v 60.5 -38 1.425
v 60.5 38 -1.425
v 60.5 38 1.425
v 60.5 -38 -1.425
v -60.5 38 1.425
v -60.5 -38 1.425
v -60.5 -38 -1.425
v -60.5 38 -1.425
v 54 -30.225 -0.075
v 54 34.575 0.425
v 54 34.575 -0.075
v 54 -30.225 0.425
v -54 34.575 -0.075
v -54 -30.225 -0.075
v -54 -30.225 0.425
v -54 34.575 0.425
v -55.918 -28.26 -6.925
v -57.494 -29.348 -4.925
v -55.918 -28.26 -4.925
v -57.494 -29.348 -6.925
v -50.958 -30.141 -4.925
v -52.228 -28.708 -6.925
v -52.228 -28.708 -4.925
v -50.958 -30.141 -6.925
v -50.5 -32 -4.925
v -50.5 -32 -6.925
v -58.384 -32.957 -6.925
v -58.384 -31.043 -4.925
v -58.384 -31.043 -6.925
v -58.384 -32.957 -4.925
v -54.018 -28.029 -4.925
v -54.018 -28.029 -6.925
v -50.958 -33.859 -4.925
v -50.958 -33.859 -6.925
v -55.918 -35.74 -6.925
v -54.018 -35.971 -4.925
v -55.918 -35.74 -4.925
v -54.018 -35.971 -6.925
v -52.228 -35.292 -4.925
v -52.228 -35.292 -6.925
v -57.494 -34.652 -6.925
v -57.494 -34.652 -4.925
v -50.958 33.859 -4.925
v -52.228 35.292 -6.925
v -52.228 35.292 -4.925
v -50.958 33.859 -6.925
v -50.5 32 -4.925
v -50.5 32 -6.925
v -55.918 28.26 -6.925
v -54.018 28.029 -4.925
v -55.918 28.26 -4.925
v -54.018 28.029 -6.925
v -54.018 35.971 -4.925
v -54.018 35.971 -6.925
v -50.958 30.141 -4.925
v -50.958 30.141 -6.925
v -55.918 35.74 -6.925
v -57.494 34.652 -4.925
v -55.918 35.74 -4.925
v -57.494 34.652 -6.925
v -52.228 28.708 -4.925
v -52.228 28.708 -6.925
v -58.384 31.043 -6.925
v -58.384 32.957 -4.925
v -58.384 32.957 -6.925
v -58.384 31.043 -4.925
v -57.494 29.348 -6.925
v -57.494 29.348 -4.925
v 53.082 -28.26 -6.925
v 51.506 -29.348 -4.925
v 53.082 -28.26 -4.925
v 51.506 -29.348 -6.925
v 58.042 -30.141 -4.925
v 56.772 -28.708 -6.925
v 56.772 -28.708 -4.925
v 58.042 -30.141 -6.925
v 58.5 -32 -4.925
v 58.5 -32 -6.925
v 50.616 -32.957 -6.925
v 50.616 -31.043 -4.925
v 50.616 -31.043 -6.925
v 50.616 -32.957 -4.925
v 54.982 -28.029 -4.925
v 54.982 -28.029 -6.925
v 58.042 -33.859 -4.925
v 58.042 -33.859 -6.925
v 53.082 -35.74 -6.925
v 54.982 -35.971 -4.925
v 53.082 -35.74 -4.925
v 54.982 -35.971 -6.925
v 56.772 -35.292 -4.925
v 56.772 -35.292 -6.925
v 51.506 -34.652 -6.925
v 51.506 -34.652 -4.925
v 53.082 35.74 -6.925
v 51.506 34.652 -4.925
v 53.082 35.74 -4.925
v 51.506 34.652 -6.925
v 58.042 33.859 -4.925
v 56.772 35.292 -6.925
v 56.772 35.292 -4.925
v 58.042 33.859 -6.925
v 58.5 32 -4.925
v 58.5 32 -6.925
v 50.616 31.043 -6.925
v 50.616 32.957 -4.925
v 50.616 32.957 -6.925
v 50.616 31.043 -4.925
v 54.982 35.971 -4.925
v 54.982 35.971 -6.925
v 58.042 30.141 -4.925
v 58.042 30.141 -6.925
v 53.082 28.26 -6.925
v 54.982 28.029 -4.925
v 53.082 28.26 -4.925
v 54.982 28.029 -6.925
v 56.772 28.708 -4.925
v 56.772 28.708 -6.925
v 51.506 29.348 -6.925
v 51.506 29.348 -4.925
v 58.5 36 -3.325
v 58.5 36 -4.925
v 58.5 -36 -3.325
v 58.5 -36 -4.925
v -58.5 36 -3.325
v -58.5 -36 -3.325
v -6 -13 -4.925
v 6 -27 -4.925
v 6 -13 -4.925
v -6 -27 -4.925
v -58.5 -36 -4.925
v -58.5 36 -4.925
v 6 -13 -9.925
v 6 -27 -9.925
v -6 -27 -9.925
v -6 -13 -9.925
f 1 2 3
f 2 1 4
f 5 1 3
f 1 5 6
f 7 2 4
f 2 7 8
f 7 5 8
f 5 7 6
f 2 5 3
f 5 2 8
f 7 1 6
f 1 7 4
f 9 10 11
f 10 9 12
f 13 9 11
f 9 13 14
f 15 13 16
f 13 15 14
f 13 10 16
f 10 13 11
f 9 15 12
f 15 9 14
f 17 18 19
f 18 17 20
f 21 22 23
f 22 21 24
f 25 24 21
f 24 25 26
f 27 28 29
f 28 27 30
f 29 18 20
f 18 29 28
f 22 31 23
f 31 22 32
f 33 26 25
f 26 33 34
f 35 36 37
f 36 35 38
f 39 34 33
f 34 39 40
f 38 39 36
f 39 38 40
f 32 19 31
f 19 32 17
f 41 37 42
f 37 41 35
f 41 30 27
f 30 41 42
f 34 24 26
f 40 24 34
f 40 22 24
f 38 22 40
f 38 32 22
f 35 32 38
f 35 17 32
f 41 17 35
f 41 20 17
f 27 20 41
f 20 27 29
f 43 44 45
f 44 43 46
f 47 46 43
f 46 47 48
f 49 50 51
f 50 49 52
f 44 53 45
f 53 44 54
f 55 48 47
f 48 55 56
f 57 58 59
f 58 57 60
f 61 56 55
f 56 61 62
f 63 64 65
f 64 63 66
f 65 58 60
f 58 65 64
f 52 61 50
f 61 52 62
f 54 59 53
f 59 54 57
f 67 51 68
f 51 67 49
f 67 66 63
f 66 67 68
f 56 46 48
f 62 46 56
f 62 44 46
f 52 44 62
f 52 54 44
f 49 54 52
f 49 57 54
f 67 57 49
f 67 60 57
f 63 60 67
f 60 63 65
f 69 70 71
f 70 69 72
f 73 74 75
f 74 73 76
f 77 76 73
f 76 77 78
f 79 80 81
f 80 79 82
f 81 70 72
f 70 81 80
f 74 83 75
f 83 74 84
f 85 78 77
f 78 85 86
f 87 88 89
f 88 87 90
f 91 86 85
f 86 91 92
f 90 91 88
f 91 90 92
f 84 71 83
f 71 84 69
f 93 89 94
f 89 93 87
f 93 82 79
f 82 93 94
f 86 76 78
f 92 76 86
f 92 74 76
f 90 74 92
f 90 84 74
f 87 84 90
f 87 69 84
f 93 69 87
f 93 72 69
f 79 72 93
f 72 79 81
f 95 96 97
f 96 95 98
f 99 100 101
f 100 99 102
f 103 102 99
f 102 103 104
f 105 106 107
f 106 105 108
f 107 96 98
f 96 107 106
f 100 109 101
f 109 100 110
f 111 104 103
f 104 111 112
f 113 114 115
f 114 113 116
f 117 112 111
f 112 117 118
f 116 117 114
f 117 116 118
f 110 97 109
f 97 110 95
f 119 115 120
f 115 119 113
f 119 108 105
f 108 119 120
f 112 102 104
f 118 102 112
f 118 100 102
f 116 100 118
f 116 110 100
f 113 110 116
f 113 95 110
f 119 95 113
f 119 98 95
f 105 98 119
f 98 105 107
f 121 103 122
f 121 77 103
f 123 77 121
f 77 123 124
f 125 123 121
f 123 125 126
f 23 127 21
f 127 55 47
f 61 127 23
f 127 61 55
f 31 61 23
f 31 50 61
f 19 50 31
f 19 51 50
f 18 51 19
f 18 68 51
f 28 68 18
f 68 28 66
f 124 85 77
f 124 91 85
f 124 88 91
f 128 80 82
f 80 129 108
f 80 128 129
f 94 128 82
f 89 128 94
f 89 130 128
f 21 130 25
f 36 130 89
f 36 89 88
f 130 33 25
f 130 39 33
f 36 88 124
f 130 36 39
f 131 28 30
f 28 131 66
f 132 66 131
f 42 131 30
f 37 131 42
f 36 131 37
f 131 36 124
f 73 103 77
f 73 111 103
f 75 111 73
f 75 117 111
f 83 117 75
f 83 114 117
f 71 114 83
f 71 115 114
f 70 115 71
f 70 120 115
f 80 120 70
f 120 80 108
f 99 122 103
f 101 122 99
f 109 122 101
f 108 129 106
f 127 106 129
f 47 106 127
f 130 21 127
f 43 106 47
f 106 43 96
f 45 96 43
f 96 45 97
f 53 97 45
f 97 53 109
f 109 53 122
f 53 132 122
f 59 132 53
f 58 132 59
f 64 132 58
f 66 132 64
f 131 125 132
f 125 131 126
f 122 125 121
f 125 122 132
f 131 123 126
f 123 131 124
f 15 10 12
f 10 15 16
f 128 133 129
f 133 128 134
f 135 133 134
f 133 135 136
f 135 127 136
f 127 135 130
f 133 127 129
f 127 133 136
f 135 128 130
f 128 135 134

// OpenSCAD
// Parameters
display_width = 121; //[60.5:242:0.1]
display_height = 76; //[38:152:0.1]
display_thickness = 2.85; //[1.425:5.7:0.01]
pcb_offset_x = 0; //[-10:10:0.1]
pcb_offset_y = 0; //[-10:10:0.1]
pcb_offset_z = 1.9; //[0:5:0.1]
pcb_thickness = 1.6; //[0.8:3.2:0.1]
pcb_margin_xy = 2; //[0:10:0.1]
aperture_min_x = -54; //[-80:-20:0.1]
aperture_min_y = -30.225; //[-60:0:0.001]
aperture_min_z = 0; //[0:2:0.01]
aperture_max_x = 54; //[20:80:0.1]
aperture_max_y = 34.575; //[0:60:0.001]
aperture_max_z = 0.5; //[0.1:2:0.01]
touch_min_x = -58.7; //[-90:-30:0.1]
touch_min_y = -34; //[-70:0:0.1]
touch_min_z = 0; //[0:2:0.01]
touch_max_x = 58.7; //[30:90:0.1]
touch_max_y = 36.25; //[0:70:0.1]
touch_max_z = 1; //[0.2:3:0.01]
mounting_thread_length = 2; //[1:4:0.1]
standoff_radius = 2.5; //[1.5:5:0.1]
standoff_inset_x = 6; //[2:15:0.1]
standoff_inset_y = 6; //[2:15:0.1]
overlap = 1; //[0.5:2:0.1]
ts_ribbon_min_x = -2.5; //[-20:10:0.1]
ts_ribbon_min_y = -39; //[-80:-10:0.1]
ts_ribbon_max_x = 10.5; //[-10:30:0.1]
ts_ribbon_max_y = -33; //[-60:0:0.1]
ts_ribbon_clearance_z = 6; //[2:12:0.1]
hdmi_width = 14; //[7:28:0.1]
hdmi_height = 6; //[3:12:0.1]
hdmi_depth = 12; //[6:24:0.1]
hdmi_offset_x = 0; //[-30:30:0.1]
hdmi_offset_y = -20; //[-40:40:0.1]
knob_radius = 4; //[2:8:0.1]
knob_height = 3; //[1.5:6:0.1]

// ---------- Derived Z reference planes (centered display at z=0) ----------
z_display_top    =  display_thickness/2;
z_display_bottom = -display_thickness/2;

// PCB sits behind display (negative Z)
z_pcb_top    = z_display_bottom - pcb_offset_z;
z_pcb_center = z_pcb_top - pcb_thickness/2;
z_pcb_bottom = z_pcb_top - pcb_thickness;

// Touch glass sits on top of display (positive Z)
touch_thickness = (touch_max_z - touch_min_z);
z_touch_bottom  = z_display_top - overlap;                 // ensure overlap into display
z_touch_center  = z_touch_bottom + touch_thickness/2;

// HDMI sits under PCB but overlaps into PCB by 'overlap'
z_hdmi_top    = z_pcb_bottom + overlap;                    // overlap into PCB
z_hdmi_center = z_hdmi_top - hdmi_height/2;

// Knobs sit under PCB but overlap into PCB by 'overlap'
z_knob_top    = z_pcb_bottom + overlap;                    // overlap into PCB
z_knob_center = z_knob_top - knob_height/2;

// ---------- FIX: add a physical connector between PCB stack and HDMI block ----------
// This resolves the floating/disconnected small blue rectangular block by creating
// a "neck" that overlaps both the PCB and the HDMI by 1-2mm.
bridge_overlap = 1.5;                                      // stronger guaranteed connection
bridge_w = hdmi_depth;                                     // match HDMI depth (X)
bridge_d = hdmi_width;                                     // match HDMI width (Y)

// Compute exact Z extents so the bridge intersects both solids
z_bridge_top    = z_pcb_bottom + bridge_overlap;           // inside PCB by bridge_overlap
z_bridge_bottom = z_hdmi_top - bridge_overlap;             // inside HDMI by bridge_overlap
bridge_h = max(0.01, z_bridge_top - z_bridge_bottom);
z_bridge_center = (z_bridge_top + z_bridge_bottom)/2;

// ---------- Parts ----------
module display_body() {
  color([0.85, 0.85, 0.8])
  difference() {
    cube([display_width, display_height, display_thickness], center=true);

    // Aperture cut (kept as in original intent)
    translate([
      (aperture_min_x + aperture_max_x)/2,
      (aperture_min_y + aperture_max_y)/2,
      z_display_top - (aperture_max_z - aperture_min_z + overlap)/2
    ])
      cube([
        aperture_max_x - aperture_min_x,
        aperture_max_y - aperture_min_y,
        aperture_max_z - aperture_min_z + overlap
      ], center=true);
  }
}

module pcb() {
  color([0.0, 0.4, 0.2])
  translate([pcb_offset_x, pcb_offset_y, z_pcb_center])
    cube([display_width - 2*pcb_margin_xy, display_height - 2*pcb_margin_xy, pcb_thickness], center=true);
}

module touch_glass() {
  // Blue central component in the screenshots: ensure it physically overlaps the display
  color([0.1, 0.1, 0.6])
  translate([
    (touch_min_x + touch_max_x)/2,
    (touch_min_y + touch_max_y)/2,
    z_touch_center
  ])
    cube([touch_max_x - touch_min_x, touch_max_y - touch_min_y, touch_thickness], center=true);
}

module hdmi() {
  // Ensure HDMI overlaps into PCB (no air gap)
  color([0.1, 0.1, 0.6])
  translate([pcb_offset_x + hdmi_offset_x, pcb_offset_y + hdmi_offset_y, z_hdmi_center])
    cube([hdmi_depth, hdmi_width, hdmi_height], center=true);
}

module hdmi_to_pcb_bridge() {
  // Physical attachment "neck" so the HDMI block is not floating/disconnected.
  // Overlaps into PCB and HDMI by bridge_overlap.
  color([0.1, 0.1, 0.6])
  translate([pcb_offset_x + hdmi_offset_x, pcb_offset_y + hdmi_offset_y, z_bridge_center])
    cube([bridge_w, bridge_d, bridge_h], center=true);
}

module screw_knob_assembly() {
  // Ensure knobs overlap into PCB (no air gap)
  color([0.2, 0.2, 0.2])
  for (i = [-1, 1], j = [-1, 1]) {
    translate([
      i * (display_width/2 - standoff_inset_x),
      j * (display_height/2 - standoff_inset_y),
      z_knob_center
    ])
      cylinder(r=knob_radius, h=knob_height, center=true);
  }
}

// ---------- Assembly (single connected solid) ----------
module assembly() {
  union() {
    display_body();
    pcb();
    touch_glass();

    // HDMI + bridge are unioned into the same solid and physically intersect PCB
    hdmi();
    hdmi_to_pcb_bridge();

    screw_knob_assembly();
  }
}

assembly();
